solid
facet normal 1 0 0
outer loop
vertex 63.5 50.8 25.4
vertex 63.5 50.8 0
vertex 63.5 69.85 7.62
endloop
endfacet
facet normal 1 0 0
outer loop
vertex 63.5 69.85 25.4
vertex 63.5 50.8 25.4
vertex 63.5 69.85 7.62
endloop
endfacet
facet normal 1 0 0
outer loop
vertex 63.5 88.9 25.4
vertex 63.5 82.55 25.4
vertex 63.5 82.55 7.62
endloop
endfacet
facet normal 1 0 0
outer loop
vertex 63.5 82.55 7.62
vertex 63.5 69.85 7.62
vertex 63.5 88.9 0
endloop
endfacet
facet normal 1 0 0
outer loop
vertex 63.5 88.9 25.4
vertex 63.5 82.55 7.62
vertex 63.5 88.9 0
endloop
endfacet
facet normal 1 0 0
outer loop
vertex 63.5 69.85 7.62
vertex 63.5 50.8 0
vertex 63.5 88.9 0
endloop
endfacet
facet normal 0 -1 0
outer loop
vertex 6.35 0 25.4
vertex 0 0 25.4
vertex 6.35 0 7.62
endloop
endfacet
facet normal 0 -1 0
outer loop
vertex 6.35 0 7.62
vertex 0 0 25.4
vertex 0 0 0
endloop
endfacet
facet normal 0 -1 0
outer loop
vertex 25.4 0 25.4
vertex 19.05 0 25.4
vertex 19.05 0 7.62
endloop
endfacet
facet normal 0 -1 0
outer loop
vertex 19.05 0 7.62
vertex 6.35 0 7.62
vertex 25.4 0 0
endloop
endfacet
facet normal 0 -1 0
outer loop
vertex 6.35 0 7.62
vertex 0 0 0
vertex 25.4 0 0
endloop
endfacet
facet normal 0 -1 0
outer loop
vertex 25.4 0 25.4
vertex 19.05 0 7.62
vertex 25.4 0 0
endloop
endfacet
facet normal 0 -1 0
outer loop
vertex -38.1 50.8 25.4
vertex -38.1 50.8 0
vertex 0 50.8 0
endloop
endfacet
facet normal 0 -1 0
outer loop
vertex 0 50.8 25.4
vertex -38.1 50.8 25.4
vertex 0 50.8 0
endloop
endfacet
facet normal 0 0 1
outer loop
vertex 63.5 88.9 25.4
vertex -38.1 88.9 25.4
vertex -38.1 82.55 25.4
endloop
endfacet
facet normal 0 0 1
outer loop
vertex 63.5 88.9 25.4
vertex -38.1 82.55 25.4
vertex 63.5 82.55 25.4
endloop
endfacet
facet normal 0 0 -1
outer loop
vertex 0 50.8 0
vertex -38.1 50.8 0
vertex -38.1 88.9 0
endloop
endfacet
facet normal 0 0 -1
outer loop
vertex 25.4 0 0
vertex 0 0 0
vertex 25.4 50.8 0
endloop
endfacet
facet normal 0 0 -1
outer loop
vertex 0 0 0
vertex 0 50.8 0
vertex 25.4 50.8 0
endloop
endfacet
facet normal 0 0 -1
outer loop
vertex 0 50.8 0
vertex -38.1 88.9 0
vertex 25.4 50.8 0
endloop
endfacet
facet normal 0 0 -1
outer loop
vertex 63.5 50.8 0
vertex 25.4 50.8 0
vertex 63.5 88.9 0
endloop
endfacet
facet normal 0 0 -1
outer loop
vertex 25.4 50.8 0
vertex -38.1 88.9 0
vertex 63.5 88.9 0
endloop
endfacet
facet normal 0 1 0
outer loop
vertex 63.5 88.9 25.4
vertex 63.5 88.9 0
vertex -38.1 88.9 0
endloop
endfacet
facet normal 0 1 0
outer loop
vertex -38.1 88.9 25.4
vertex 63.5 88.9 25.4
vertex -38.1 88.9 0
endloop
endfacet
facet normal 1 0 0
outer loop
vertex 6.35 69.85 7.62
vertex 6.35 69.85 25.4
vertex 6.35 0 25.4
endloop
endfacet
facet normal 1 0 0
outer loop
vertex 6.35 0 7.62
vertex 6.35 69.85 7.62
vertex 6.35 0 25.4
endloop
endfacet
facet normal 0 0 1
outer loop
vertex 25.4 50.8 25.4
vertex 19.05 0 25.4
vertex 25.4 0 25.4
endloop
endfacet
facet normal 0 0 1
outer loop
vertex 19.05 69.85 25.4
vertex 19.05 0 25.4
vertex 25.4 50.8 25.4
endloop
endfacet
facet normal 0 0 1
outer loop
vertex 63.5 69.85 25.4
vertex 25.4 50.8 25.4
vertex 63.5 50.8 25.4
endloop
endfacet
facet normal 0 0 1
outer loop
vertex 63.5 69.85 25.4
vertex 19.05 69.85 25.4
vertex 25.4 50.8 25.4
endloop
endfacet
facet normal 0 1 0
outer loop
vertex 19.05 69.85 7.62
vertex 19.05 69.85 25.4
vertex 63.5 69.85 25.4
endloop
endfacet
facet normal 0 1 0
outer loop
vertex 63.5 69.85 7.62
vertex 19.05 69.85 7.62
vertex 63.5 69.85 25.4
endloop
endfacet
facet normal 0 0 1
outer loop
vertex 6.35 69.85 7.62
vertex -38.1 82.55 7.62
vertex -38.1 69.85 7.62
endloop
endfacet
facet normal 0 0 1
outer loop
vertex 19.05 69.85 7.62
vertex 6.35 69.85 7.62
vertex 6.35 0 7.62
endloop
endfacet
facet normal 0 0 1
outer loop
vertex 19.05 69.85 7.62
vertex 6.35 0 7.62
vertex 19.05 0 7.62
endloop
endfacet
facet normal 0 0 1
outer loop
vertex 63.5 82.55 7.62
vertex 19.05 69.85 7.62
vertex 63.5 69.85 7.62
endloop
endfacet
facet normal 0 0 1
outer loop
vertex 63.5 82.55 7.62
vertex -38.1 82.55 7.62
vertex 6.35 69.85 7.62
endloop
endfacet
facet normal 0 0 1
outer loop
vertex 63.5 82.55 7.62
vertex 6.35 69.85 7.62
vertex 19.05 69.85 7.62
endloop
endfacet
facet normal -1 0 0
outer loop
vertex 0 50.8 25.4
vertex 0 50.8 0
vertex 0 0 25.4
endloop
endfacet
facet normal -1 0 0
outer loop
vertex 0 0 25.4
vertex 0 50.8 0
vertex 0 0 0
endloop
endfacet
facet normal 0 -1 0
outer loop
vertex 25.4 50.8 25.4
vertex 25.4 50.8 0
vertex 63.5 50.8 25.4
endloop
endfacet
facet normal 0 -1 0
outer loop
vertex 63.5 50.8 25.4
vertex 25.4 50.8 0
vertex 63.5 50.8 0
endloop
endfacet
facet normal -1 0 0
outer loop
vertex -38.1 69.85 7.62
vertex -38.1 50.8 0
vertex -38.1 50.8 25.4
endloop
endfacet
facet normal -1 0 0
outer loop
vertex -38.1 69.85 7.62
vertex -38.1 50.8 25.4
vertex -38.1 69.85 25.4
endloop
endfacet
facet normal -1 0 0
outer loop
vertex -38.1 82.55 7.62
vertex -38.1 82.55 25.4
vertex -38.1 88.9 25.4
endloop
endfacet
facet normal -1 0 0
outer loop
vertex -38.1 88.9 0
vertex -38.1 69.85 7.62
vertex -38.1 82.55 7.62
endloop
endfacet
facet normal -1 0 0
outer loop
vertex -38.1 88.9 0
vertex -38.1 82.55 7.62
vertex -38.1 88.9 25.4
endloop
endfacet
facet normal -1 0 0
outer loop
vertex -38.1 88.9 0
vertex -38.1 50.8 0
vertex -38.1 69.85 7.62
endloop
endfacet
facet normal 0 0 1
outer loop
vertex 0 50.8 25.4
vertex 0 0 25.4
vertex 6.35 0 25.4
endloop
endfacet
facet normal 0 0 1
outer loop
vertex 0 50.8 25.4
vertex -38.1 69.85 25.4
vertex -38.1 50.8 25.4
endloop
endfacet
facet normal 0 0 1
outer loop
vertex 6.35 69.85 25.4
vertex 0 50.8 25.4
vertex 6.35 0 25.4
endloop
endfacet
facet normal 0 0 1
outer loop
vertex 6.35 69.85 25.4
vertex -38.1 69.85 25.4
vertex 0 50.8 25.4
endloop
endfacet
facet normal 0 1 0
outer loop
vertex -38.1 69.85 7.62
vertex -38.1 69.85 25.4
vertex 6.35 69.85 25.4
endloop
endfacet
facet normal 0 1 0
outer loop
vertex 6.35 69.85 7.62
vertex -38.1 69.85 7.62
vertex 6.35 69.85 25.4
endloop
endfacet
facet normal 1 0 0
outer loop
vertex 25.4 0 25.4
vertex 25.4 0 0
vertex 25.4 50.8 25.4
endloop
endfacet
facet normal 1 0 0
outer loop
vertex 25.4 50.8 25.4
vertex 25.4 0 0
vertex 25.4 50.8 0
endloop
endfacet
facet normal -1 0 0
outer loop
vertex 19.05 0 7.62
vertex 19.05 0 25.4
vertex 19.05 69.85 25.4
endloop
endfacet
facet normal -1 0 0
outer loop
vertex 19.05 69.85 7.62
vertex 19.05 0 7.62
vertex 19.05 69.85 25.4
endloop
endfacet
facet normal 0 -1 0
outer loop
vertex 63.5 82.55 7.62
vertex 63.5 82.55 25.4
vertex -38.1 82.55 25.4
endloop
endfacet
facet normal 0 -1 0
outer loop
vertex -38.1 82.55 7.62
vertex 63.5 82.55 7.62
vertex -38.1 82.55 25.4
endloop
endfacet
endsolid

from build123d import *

# Parameters (mm, degrees)
F0_W     = 25.4
F0_H     = 50.8
F0_W_2   = 38.1
F0_H_2   = 38.1
F1_DEPTH = 25.4
F2_W     = 12.7
F2_H     = 19.05
F2_H_2   = 50.8
F3_DEPTH = 17.78


with BuildPart() as f1:
    # F0 (on Top) → F1 (new body)
    with BuildSketch(Plane.XY):
        with Locations((12.7, 25.4)):
            Rectangle(F0_W, F0_H)
        with Locations((44.45, 69.85)):
            Rectangle(F0_W_2, F0_H_2)
        with Locations((12.7, 69.85)):
            Rectangle(F0_W, F0_H_2)
        with Locations((-19.05, 69.85)):
            Rectangle(F0_W_2, F0_H_2)
    extrude(amount=F1_DEPTH)

    # F2 (on face) → F3 (cut)
    with BuildSketch(Plane.XY.offset(25.4)):
        Polygon((-38.1, 69.85), (6.35, 69.85), (19.05, 69.85), (63.5, 69.85), (63.5, 82.55), (-38.1, 82.55), align=None)
        with Locations((12.7, 60.325)):
            Rectangle(F2_W, F2_H)
        with Locations((12.7, 25.4)):
            Rectangle(F2_W, F2_H_2)
    extrude(amount=-F3_DEPTH, mode=Mode.SUBTRACT)


solid = f1.part
